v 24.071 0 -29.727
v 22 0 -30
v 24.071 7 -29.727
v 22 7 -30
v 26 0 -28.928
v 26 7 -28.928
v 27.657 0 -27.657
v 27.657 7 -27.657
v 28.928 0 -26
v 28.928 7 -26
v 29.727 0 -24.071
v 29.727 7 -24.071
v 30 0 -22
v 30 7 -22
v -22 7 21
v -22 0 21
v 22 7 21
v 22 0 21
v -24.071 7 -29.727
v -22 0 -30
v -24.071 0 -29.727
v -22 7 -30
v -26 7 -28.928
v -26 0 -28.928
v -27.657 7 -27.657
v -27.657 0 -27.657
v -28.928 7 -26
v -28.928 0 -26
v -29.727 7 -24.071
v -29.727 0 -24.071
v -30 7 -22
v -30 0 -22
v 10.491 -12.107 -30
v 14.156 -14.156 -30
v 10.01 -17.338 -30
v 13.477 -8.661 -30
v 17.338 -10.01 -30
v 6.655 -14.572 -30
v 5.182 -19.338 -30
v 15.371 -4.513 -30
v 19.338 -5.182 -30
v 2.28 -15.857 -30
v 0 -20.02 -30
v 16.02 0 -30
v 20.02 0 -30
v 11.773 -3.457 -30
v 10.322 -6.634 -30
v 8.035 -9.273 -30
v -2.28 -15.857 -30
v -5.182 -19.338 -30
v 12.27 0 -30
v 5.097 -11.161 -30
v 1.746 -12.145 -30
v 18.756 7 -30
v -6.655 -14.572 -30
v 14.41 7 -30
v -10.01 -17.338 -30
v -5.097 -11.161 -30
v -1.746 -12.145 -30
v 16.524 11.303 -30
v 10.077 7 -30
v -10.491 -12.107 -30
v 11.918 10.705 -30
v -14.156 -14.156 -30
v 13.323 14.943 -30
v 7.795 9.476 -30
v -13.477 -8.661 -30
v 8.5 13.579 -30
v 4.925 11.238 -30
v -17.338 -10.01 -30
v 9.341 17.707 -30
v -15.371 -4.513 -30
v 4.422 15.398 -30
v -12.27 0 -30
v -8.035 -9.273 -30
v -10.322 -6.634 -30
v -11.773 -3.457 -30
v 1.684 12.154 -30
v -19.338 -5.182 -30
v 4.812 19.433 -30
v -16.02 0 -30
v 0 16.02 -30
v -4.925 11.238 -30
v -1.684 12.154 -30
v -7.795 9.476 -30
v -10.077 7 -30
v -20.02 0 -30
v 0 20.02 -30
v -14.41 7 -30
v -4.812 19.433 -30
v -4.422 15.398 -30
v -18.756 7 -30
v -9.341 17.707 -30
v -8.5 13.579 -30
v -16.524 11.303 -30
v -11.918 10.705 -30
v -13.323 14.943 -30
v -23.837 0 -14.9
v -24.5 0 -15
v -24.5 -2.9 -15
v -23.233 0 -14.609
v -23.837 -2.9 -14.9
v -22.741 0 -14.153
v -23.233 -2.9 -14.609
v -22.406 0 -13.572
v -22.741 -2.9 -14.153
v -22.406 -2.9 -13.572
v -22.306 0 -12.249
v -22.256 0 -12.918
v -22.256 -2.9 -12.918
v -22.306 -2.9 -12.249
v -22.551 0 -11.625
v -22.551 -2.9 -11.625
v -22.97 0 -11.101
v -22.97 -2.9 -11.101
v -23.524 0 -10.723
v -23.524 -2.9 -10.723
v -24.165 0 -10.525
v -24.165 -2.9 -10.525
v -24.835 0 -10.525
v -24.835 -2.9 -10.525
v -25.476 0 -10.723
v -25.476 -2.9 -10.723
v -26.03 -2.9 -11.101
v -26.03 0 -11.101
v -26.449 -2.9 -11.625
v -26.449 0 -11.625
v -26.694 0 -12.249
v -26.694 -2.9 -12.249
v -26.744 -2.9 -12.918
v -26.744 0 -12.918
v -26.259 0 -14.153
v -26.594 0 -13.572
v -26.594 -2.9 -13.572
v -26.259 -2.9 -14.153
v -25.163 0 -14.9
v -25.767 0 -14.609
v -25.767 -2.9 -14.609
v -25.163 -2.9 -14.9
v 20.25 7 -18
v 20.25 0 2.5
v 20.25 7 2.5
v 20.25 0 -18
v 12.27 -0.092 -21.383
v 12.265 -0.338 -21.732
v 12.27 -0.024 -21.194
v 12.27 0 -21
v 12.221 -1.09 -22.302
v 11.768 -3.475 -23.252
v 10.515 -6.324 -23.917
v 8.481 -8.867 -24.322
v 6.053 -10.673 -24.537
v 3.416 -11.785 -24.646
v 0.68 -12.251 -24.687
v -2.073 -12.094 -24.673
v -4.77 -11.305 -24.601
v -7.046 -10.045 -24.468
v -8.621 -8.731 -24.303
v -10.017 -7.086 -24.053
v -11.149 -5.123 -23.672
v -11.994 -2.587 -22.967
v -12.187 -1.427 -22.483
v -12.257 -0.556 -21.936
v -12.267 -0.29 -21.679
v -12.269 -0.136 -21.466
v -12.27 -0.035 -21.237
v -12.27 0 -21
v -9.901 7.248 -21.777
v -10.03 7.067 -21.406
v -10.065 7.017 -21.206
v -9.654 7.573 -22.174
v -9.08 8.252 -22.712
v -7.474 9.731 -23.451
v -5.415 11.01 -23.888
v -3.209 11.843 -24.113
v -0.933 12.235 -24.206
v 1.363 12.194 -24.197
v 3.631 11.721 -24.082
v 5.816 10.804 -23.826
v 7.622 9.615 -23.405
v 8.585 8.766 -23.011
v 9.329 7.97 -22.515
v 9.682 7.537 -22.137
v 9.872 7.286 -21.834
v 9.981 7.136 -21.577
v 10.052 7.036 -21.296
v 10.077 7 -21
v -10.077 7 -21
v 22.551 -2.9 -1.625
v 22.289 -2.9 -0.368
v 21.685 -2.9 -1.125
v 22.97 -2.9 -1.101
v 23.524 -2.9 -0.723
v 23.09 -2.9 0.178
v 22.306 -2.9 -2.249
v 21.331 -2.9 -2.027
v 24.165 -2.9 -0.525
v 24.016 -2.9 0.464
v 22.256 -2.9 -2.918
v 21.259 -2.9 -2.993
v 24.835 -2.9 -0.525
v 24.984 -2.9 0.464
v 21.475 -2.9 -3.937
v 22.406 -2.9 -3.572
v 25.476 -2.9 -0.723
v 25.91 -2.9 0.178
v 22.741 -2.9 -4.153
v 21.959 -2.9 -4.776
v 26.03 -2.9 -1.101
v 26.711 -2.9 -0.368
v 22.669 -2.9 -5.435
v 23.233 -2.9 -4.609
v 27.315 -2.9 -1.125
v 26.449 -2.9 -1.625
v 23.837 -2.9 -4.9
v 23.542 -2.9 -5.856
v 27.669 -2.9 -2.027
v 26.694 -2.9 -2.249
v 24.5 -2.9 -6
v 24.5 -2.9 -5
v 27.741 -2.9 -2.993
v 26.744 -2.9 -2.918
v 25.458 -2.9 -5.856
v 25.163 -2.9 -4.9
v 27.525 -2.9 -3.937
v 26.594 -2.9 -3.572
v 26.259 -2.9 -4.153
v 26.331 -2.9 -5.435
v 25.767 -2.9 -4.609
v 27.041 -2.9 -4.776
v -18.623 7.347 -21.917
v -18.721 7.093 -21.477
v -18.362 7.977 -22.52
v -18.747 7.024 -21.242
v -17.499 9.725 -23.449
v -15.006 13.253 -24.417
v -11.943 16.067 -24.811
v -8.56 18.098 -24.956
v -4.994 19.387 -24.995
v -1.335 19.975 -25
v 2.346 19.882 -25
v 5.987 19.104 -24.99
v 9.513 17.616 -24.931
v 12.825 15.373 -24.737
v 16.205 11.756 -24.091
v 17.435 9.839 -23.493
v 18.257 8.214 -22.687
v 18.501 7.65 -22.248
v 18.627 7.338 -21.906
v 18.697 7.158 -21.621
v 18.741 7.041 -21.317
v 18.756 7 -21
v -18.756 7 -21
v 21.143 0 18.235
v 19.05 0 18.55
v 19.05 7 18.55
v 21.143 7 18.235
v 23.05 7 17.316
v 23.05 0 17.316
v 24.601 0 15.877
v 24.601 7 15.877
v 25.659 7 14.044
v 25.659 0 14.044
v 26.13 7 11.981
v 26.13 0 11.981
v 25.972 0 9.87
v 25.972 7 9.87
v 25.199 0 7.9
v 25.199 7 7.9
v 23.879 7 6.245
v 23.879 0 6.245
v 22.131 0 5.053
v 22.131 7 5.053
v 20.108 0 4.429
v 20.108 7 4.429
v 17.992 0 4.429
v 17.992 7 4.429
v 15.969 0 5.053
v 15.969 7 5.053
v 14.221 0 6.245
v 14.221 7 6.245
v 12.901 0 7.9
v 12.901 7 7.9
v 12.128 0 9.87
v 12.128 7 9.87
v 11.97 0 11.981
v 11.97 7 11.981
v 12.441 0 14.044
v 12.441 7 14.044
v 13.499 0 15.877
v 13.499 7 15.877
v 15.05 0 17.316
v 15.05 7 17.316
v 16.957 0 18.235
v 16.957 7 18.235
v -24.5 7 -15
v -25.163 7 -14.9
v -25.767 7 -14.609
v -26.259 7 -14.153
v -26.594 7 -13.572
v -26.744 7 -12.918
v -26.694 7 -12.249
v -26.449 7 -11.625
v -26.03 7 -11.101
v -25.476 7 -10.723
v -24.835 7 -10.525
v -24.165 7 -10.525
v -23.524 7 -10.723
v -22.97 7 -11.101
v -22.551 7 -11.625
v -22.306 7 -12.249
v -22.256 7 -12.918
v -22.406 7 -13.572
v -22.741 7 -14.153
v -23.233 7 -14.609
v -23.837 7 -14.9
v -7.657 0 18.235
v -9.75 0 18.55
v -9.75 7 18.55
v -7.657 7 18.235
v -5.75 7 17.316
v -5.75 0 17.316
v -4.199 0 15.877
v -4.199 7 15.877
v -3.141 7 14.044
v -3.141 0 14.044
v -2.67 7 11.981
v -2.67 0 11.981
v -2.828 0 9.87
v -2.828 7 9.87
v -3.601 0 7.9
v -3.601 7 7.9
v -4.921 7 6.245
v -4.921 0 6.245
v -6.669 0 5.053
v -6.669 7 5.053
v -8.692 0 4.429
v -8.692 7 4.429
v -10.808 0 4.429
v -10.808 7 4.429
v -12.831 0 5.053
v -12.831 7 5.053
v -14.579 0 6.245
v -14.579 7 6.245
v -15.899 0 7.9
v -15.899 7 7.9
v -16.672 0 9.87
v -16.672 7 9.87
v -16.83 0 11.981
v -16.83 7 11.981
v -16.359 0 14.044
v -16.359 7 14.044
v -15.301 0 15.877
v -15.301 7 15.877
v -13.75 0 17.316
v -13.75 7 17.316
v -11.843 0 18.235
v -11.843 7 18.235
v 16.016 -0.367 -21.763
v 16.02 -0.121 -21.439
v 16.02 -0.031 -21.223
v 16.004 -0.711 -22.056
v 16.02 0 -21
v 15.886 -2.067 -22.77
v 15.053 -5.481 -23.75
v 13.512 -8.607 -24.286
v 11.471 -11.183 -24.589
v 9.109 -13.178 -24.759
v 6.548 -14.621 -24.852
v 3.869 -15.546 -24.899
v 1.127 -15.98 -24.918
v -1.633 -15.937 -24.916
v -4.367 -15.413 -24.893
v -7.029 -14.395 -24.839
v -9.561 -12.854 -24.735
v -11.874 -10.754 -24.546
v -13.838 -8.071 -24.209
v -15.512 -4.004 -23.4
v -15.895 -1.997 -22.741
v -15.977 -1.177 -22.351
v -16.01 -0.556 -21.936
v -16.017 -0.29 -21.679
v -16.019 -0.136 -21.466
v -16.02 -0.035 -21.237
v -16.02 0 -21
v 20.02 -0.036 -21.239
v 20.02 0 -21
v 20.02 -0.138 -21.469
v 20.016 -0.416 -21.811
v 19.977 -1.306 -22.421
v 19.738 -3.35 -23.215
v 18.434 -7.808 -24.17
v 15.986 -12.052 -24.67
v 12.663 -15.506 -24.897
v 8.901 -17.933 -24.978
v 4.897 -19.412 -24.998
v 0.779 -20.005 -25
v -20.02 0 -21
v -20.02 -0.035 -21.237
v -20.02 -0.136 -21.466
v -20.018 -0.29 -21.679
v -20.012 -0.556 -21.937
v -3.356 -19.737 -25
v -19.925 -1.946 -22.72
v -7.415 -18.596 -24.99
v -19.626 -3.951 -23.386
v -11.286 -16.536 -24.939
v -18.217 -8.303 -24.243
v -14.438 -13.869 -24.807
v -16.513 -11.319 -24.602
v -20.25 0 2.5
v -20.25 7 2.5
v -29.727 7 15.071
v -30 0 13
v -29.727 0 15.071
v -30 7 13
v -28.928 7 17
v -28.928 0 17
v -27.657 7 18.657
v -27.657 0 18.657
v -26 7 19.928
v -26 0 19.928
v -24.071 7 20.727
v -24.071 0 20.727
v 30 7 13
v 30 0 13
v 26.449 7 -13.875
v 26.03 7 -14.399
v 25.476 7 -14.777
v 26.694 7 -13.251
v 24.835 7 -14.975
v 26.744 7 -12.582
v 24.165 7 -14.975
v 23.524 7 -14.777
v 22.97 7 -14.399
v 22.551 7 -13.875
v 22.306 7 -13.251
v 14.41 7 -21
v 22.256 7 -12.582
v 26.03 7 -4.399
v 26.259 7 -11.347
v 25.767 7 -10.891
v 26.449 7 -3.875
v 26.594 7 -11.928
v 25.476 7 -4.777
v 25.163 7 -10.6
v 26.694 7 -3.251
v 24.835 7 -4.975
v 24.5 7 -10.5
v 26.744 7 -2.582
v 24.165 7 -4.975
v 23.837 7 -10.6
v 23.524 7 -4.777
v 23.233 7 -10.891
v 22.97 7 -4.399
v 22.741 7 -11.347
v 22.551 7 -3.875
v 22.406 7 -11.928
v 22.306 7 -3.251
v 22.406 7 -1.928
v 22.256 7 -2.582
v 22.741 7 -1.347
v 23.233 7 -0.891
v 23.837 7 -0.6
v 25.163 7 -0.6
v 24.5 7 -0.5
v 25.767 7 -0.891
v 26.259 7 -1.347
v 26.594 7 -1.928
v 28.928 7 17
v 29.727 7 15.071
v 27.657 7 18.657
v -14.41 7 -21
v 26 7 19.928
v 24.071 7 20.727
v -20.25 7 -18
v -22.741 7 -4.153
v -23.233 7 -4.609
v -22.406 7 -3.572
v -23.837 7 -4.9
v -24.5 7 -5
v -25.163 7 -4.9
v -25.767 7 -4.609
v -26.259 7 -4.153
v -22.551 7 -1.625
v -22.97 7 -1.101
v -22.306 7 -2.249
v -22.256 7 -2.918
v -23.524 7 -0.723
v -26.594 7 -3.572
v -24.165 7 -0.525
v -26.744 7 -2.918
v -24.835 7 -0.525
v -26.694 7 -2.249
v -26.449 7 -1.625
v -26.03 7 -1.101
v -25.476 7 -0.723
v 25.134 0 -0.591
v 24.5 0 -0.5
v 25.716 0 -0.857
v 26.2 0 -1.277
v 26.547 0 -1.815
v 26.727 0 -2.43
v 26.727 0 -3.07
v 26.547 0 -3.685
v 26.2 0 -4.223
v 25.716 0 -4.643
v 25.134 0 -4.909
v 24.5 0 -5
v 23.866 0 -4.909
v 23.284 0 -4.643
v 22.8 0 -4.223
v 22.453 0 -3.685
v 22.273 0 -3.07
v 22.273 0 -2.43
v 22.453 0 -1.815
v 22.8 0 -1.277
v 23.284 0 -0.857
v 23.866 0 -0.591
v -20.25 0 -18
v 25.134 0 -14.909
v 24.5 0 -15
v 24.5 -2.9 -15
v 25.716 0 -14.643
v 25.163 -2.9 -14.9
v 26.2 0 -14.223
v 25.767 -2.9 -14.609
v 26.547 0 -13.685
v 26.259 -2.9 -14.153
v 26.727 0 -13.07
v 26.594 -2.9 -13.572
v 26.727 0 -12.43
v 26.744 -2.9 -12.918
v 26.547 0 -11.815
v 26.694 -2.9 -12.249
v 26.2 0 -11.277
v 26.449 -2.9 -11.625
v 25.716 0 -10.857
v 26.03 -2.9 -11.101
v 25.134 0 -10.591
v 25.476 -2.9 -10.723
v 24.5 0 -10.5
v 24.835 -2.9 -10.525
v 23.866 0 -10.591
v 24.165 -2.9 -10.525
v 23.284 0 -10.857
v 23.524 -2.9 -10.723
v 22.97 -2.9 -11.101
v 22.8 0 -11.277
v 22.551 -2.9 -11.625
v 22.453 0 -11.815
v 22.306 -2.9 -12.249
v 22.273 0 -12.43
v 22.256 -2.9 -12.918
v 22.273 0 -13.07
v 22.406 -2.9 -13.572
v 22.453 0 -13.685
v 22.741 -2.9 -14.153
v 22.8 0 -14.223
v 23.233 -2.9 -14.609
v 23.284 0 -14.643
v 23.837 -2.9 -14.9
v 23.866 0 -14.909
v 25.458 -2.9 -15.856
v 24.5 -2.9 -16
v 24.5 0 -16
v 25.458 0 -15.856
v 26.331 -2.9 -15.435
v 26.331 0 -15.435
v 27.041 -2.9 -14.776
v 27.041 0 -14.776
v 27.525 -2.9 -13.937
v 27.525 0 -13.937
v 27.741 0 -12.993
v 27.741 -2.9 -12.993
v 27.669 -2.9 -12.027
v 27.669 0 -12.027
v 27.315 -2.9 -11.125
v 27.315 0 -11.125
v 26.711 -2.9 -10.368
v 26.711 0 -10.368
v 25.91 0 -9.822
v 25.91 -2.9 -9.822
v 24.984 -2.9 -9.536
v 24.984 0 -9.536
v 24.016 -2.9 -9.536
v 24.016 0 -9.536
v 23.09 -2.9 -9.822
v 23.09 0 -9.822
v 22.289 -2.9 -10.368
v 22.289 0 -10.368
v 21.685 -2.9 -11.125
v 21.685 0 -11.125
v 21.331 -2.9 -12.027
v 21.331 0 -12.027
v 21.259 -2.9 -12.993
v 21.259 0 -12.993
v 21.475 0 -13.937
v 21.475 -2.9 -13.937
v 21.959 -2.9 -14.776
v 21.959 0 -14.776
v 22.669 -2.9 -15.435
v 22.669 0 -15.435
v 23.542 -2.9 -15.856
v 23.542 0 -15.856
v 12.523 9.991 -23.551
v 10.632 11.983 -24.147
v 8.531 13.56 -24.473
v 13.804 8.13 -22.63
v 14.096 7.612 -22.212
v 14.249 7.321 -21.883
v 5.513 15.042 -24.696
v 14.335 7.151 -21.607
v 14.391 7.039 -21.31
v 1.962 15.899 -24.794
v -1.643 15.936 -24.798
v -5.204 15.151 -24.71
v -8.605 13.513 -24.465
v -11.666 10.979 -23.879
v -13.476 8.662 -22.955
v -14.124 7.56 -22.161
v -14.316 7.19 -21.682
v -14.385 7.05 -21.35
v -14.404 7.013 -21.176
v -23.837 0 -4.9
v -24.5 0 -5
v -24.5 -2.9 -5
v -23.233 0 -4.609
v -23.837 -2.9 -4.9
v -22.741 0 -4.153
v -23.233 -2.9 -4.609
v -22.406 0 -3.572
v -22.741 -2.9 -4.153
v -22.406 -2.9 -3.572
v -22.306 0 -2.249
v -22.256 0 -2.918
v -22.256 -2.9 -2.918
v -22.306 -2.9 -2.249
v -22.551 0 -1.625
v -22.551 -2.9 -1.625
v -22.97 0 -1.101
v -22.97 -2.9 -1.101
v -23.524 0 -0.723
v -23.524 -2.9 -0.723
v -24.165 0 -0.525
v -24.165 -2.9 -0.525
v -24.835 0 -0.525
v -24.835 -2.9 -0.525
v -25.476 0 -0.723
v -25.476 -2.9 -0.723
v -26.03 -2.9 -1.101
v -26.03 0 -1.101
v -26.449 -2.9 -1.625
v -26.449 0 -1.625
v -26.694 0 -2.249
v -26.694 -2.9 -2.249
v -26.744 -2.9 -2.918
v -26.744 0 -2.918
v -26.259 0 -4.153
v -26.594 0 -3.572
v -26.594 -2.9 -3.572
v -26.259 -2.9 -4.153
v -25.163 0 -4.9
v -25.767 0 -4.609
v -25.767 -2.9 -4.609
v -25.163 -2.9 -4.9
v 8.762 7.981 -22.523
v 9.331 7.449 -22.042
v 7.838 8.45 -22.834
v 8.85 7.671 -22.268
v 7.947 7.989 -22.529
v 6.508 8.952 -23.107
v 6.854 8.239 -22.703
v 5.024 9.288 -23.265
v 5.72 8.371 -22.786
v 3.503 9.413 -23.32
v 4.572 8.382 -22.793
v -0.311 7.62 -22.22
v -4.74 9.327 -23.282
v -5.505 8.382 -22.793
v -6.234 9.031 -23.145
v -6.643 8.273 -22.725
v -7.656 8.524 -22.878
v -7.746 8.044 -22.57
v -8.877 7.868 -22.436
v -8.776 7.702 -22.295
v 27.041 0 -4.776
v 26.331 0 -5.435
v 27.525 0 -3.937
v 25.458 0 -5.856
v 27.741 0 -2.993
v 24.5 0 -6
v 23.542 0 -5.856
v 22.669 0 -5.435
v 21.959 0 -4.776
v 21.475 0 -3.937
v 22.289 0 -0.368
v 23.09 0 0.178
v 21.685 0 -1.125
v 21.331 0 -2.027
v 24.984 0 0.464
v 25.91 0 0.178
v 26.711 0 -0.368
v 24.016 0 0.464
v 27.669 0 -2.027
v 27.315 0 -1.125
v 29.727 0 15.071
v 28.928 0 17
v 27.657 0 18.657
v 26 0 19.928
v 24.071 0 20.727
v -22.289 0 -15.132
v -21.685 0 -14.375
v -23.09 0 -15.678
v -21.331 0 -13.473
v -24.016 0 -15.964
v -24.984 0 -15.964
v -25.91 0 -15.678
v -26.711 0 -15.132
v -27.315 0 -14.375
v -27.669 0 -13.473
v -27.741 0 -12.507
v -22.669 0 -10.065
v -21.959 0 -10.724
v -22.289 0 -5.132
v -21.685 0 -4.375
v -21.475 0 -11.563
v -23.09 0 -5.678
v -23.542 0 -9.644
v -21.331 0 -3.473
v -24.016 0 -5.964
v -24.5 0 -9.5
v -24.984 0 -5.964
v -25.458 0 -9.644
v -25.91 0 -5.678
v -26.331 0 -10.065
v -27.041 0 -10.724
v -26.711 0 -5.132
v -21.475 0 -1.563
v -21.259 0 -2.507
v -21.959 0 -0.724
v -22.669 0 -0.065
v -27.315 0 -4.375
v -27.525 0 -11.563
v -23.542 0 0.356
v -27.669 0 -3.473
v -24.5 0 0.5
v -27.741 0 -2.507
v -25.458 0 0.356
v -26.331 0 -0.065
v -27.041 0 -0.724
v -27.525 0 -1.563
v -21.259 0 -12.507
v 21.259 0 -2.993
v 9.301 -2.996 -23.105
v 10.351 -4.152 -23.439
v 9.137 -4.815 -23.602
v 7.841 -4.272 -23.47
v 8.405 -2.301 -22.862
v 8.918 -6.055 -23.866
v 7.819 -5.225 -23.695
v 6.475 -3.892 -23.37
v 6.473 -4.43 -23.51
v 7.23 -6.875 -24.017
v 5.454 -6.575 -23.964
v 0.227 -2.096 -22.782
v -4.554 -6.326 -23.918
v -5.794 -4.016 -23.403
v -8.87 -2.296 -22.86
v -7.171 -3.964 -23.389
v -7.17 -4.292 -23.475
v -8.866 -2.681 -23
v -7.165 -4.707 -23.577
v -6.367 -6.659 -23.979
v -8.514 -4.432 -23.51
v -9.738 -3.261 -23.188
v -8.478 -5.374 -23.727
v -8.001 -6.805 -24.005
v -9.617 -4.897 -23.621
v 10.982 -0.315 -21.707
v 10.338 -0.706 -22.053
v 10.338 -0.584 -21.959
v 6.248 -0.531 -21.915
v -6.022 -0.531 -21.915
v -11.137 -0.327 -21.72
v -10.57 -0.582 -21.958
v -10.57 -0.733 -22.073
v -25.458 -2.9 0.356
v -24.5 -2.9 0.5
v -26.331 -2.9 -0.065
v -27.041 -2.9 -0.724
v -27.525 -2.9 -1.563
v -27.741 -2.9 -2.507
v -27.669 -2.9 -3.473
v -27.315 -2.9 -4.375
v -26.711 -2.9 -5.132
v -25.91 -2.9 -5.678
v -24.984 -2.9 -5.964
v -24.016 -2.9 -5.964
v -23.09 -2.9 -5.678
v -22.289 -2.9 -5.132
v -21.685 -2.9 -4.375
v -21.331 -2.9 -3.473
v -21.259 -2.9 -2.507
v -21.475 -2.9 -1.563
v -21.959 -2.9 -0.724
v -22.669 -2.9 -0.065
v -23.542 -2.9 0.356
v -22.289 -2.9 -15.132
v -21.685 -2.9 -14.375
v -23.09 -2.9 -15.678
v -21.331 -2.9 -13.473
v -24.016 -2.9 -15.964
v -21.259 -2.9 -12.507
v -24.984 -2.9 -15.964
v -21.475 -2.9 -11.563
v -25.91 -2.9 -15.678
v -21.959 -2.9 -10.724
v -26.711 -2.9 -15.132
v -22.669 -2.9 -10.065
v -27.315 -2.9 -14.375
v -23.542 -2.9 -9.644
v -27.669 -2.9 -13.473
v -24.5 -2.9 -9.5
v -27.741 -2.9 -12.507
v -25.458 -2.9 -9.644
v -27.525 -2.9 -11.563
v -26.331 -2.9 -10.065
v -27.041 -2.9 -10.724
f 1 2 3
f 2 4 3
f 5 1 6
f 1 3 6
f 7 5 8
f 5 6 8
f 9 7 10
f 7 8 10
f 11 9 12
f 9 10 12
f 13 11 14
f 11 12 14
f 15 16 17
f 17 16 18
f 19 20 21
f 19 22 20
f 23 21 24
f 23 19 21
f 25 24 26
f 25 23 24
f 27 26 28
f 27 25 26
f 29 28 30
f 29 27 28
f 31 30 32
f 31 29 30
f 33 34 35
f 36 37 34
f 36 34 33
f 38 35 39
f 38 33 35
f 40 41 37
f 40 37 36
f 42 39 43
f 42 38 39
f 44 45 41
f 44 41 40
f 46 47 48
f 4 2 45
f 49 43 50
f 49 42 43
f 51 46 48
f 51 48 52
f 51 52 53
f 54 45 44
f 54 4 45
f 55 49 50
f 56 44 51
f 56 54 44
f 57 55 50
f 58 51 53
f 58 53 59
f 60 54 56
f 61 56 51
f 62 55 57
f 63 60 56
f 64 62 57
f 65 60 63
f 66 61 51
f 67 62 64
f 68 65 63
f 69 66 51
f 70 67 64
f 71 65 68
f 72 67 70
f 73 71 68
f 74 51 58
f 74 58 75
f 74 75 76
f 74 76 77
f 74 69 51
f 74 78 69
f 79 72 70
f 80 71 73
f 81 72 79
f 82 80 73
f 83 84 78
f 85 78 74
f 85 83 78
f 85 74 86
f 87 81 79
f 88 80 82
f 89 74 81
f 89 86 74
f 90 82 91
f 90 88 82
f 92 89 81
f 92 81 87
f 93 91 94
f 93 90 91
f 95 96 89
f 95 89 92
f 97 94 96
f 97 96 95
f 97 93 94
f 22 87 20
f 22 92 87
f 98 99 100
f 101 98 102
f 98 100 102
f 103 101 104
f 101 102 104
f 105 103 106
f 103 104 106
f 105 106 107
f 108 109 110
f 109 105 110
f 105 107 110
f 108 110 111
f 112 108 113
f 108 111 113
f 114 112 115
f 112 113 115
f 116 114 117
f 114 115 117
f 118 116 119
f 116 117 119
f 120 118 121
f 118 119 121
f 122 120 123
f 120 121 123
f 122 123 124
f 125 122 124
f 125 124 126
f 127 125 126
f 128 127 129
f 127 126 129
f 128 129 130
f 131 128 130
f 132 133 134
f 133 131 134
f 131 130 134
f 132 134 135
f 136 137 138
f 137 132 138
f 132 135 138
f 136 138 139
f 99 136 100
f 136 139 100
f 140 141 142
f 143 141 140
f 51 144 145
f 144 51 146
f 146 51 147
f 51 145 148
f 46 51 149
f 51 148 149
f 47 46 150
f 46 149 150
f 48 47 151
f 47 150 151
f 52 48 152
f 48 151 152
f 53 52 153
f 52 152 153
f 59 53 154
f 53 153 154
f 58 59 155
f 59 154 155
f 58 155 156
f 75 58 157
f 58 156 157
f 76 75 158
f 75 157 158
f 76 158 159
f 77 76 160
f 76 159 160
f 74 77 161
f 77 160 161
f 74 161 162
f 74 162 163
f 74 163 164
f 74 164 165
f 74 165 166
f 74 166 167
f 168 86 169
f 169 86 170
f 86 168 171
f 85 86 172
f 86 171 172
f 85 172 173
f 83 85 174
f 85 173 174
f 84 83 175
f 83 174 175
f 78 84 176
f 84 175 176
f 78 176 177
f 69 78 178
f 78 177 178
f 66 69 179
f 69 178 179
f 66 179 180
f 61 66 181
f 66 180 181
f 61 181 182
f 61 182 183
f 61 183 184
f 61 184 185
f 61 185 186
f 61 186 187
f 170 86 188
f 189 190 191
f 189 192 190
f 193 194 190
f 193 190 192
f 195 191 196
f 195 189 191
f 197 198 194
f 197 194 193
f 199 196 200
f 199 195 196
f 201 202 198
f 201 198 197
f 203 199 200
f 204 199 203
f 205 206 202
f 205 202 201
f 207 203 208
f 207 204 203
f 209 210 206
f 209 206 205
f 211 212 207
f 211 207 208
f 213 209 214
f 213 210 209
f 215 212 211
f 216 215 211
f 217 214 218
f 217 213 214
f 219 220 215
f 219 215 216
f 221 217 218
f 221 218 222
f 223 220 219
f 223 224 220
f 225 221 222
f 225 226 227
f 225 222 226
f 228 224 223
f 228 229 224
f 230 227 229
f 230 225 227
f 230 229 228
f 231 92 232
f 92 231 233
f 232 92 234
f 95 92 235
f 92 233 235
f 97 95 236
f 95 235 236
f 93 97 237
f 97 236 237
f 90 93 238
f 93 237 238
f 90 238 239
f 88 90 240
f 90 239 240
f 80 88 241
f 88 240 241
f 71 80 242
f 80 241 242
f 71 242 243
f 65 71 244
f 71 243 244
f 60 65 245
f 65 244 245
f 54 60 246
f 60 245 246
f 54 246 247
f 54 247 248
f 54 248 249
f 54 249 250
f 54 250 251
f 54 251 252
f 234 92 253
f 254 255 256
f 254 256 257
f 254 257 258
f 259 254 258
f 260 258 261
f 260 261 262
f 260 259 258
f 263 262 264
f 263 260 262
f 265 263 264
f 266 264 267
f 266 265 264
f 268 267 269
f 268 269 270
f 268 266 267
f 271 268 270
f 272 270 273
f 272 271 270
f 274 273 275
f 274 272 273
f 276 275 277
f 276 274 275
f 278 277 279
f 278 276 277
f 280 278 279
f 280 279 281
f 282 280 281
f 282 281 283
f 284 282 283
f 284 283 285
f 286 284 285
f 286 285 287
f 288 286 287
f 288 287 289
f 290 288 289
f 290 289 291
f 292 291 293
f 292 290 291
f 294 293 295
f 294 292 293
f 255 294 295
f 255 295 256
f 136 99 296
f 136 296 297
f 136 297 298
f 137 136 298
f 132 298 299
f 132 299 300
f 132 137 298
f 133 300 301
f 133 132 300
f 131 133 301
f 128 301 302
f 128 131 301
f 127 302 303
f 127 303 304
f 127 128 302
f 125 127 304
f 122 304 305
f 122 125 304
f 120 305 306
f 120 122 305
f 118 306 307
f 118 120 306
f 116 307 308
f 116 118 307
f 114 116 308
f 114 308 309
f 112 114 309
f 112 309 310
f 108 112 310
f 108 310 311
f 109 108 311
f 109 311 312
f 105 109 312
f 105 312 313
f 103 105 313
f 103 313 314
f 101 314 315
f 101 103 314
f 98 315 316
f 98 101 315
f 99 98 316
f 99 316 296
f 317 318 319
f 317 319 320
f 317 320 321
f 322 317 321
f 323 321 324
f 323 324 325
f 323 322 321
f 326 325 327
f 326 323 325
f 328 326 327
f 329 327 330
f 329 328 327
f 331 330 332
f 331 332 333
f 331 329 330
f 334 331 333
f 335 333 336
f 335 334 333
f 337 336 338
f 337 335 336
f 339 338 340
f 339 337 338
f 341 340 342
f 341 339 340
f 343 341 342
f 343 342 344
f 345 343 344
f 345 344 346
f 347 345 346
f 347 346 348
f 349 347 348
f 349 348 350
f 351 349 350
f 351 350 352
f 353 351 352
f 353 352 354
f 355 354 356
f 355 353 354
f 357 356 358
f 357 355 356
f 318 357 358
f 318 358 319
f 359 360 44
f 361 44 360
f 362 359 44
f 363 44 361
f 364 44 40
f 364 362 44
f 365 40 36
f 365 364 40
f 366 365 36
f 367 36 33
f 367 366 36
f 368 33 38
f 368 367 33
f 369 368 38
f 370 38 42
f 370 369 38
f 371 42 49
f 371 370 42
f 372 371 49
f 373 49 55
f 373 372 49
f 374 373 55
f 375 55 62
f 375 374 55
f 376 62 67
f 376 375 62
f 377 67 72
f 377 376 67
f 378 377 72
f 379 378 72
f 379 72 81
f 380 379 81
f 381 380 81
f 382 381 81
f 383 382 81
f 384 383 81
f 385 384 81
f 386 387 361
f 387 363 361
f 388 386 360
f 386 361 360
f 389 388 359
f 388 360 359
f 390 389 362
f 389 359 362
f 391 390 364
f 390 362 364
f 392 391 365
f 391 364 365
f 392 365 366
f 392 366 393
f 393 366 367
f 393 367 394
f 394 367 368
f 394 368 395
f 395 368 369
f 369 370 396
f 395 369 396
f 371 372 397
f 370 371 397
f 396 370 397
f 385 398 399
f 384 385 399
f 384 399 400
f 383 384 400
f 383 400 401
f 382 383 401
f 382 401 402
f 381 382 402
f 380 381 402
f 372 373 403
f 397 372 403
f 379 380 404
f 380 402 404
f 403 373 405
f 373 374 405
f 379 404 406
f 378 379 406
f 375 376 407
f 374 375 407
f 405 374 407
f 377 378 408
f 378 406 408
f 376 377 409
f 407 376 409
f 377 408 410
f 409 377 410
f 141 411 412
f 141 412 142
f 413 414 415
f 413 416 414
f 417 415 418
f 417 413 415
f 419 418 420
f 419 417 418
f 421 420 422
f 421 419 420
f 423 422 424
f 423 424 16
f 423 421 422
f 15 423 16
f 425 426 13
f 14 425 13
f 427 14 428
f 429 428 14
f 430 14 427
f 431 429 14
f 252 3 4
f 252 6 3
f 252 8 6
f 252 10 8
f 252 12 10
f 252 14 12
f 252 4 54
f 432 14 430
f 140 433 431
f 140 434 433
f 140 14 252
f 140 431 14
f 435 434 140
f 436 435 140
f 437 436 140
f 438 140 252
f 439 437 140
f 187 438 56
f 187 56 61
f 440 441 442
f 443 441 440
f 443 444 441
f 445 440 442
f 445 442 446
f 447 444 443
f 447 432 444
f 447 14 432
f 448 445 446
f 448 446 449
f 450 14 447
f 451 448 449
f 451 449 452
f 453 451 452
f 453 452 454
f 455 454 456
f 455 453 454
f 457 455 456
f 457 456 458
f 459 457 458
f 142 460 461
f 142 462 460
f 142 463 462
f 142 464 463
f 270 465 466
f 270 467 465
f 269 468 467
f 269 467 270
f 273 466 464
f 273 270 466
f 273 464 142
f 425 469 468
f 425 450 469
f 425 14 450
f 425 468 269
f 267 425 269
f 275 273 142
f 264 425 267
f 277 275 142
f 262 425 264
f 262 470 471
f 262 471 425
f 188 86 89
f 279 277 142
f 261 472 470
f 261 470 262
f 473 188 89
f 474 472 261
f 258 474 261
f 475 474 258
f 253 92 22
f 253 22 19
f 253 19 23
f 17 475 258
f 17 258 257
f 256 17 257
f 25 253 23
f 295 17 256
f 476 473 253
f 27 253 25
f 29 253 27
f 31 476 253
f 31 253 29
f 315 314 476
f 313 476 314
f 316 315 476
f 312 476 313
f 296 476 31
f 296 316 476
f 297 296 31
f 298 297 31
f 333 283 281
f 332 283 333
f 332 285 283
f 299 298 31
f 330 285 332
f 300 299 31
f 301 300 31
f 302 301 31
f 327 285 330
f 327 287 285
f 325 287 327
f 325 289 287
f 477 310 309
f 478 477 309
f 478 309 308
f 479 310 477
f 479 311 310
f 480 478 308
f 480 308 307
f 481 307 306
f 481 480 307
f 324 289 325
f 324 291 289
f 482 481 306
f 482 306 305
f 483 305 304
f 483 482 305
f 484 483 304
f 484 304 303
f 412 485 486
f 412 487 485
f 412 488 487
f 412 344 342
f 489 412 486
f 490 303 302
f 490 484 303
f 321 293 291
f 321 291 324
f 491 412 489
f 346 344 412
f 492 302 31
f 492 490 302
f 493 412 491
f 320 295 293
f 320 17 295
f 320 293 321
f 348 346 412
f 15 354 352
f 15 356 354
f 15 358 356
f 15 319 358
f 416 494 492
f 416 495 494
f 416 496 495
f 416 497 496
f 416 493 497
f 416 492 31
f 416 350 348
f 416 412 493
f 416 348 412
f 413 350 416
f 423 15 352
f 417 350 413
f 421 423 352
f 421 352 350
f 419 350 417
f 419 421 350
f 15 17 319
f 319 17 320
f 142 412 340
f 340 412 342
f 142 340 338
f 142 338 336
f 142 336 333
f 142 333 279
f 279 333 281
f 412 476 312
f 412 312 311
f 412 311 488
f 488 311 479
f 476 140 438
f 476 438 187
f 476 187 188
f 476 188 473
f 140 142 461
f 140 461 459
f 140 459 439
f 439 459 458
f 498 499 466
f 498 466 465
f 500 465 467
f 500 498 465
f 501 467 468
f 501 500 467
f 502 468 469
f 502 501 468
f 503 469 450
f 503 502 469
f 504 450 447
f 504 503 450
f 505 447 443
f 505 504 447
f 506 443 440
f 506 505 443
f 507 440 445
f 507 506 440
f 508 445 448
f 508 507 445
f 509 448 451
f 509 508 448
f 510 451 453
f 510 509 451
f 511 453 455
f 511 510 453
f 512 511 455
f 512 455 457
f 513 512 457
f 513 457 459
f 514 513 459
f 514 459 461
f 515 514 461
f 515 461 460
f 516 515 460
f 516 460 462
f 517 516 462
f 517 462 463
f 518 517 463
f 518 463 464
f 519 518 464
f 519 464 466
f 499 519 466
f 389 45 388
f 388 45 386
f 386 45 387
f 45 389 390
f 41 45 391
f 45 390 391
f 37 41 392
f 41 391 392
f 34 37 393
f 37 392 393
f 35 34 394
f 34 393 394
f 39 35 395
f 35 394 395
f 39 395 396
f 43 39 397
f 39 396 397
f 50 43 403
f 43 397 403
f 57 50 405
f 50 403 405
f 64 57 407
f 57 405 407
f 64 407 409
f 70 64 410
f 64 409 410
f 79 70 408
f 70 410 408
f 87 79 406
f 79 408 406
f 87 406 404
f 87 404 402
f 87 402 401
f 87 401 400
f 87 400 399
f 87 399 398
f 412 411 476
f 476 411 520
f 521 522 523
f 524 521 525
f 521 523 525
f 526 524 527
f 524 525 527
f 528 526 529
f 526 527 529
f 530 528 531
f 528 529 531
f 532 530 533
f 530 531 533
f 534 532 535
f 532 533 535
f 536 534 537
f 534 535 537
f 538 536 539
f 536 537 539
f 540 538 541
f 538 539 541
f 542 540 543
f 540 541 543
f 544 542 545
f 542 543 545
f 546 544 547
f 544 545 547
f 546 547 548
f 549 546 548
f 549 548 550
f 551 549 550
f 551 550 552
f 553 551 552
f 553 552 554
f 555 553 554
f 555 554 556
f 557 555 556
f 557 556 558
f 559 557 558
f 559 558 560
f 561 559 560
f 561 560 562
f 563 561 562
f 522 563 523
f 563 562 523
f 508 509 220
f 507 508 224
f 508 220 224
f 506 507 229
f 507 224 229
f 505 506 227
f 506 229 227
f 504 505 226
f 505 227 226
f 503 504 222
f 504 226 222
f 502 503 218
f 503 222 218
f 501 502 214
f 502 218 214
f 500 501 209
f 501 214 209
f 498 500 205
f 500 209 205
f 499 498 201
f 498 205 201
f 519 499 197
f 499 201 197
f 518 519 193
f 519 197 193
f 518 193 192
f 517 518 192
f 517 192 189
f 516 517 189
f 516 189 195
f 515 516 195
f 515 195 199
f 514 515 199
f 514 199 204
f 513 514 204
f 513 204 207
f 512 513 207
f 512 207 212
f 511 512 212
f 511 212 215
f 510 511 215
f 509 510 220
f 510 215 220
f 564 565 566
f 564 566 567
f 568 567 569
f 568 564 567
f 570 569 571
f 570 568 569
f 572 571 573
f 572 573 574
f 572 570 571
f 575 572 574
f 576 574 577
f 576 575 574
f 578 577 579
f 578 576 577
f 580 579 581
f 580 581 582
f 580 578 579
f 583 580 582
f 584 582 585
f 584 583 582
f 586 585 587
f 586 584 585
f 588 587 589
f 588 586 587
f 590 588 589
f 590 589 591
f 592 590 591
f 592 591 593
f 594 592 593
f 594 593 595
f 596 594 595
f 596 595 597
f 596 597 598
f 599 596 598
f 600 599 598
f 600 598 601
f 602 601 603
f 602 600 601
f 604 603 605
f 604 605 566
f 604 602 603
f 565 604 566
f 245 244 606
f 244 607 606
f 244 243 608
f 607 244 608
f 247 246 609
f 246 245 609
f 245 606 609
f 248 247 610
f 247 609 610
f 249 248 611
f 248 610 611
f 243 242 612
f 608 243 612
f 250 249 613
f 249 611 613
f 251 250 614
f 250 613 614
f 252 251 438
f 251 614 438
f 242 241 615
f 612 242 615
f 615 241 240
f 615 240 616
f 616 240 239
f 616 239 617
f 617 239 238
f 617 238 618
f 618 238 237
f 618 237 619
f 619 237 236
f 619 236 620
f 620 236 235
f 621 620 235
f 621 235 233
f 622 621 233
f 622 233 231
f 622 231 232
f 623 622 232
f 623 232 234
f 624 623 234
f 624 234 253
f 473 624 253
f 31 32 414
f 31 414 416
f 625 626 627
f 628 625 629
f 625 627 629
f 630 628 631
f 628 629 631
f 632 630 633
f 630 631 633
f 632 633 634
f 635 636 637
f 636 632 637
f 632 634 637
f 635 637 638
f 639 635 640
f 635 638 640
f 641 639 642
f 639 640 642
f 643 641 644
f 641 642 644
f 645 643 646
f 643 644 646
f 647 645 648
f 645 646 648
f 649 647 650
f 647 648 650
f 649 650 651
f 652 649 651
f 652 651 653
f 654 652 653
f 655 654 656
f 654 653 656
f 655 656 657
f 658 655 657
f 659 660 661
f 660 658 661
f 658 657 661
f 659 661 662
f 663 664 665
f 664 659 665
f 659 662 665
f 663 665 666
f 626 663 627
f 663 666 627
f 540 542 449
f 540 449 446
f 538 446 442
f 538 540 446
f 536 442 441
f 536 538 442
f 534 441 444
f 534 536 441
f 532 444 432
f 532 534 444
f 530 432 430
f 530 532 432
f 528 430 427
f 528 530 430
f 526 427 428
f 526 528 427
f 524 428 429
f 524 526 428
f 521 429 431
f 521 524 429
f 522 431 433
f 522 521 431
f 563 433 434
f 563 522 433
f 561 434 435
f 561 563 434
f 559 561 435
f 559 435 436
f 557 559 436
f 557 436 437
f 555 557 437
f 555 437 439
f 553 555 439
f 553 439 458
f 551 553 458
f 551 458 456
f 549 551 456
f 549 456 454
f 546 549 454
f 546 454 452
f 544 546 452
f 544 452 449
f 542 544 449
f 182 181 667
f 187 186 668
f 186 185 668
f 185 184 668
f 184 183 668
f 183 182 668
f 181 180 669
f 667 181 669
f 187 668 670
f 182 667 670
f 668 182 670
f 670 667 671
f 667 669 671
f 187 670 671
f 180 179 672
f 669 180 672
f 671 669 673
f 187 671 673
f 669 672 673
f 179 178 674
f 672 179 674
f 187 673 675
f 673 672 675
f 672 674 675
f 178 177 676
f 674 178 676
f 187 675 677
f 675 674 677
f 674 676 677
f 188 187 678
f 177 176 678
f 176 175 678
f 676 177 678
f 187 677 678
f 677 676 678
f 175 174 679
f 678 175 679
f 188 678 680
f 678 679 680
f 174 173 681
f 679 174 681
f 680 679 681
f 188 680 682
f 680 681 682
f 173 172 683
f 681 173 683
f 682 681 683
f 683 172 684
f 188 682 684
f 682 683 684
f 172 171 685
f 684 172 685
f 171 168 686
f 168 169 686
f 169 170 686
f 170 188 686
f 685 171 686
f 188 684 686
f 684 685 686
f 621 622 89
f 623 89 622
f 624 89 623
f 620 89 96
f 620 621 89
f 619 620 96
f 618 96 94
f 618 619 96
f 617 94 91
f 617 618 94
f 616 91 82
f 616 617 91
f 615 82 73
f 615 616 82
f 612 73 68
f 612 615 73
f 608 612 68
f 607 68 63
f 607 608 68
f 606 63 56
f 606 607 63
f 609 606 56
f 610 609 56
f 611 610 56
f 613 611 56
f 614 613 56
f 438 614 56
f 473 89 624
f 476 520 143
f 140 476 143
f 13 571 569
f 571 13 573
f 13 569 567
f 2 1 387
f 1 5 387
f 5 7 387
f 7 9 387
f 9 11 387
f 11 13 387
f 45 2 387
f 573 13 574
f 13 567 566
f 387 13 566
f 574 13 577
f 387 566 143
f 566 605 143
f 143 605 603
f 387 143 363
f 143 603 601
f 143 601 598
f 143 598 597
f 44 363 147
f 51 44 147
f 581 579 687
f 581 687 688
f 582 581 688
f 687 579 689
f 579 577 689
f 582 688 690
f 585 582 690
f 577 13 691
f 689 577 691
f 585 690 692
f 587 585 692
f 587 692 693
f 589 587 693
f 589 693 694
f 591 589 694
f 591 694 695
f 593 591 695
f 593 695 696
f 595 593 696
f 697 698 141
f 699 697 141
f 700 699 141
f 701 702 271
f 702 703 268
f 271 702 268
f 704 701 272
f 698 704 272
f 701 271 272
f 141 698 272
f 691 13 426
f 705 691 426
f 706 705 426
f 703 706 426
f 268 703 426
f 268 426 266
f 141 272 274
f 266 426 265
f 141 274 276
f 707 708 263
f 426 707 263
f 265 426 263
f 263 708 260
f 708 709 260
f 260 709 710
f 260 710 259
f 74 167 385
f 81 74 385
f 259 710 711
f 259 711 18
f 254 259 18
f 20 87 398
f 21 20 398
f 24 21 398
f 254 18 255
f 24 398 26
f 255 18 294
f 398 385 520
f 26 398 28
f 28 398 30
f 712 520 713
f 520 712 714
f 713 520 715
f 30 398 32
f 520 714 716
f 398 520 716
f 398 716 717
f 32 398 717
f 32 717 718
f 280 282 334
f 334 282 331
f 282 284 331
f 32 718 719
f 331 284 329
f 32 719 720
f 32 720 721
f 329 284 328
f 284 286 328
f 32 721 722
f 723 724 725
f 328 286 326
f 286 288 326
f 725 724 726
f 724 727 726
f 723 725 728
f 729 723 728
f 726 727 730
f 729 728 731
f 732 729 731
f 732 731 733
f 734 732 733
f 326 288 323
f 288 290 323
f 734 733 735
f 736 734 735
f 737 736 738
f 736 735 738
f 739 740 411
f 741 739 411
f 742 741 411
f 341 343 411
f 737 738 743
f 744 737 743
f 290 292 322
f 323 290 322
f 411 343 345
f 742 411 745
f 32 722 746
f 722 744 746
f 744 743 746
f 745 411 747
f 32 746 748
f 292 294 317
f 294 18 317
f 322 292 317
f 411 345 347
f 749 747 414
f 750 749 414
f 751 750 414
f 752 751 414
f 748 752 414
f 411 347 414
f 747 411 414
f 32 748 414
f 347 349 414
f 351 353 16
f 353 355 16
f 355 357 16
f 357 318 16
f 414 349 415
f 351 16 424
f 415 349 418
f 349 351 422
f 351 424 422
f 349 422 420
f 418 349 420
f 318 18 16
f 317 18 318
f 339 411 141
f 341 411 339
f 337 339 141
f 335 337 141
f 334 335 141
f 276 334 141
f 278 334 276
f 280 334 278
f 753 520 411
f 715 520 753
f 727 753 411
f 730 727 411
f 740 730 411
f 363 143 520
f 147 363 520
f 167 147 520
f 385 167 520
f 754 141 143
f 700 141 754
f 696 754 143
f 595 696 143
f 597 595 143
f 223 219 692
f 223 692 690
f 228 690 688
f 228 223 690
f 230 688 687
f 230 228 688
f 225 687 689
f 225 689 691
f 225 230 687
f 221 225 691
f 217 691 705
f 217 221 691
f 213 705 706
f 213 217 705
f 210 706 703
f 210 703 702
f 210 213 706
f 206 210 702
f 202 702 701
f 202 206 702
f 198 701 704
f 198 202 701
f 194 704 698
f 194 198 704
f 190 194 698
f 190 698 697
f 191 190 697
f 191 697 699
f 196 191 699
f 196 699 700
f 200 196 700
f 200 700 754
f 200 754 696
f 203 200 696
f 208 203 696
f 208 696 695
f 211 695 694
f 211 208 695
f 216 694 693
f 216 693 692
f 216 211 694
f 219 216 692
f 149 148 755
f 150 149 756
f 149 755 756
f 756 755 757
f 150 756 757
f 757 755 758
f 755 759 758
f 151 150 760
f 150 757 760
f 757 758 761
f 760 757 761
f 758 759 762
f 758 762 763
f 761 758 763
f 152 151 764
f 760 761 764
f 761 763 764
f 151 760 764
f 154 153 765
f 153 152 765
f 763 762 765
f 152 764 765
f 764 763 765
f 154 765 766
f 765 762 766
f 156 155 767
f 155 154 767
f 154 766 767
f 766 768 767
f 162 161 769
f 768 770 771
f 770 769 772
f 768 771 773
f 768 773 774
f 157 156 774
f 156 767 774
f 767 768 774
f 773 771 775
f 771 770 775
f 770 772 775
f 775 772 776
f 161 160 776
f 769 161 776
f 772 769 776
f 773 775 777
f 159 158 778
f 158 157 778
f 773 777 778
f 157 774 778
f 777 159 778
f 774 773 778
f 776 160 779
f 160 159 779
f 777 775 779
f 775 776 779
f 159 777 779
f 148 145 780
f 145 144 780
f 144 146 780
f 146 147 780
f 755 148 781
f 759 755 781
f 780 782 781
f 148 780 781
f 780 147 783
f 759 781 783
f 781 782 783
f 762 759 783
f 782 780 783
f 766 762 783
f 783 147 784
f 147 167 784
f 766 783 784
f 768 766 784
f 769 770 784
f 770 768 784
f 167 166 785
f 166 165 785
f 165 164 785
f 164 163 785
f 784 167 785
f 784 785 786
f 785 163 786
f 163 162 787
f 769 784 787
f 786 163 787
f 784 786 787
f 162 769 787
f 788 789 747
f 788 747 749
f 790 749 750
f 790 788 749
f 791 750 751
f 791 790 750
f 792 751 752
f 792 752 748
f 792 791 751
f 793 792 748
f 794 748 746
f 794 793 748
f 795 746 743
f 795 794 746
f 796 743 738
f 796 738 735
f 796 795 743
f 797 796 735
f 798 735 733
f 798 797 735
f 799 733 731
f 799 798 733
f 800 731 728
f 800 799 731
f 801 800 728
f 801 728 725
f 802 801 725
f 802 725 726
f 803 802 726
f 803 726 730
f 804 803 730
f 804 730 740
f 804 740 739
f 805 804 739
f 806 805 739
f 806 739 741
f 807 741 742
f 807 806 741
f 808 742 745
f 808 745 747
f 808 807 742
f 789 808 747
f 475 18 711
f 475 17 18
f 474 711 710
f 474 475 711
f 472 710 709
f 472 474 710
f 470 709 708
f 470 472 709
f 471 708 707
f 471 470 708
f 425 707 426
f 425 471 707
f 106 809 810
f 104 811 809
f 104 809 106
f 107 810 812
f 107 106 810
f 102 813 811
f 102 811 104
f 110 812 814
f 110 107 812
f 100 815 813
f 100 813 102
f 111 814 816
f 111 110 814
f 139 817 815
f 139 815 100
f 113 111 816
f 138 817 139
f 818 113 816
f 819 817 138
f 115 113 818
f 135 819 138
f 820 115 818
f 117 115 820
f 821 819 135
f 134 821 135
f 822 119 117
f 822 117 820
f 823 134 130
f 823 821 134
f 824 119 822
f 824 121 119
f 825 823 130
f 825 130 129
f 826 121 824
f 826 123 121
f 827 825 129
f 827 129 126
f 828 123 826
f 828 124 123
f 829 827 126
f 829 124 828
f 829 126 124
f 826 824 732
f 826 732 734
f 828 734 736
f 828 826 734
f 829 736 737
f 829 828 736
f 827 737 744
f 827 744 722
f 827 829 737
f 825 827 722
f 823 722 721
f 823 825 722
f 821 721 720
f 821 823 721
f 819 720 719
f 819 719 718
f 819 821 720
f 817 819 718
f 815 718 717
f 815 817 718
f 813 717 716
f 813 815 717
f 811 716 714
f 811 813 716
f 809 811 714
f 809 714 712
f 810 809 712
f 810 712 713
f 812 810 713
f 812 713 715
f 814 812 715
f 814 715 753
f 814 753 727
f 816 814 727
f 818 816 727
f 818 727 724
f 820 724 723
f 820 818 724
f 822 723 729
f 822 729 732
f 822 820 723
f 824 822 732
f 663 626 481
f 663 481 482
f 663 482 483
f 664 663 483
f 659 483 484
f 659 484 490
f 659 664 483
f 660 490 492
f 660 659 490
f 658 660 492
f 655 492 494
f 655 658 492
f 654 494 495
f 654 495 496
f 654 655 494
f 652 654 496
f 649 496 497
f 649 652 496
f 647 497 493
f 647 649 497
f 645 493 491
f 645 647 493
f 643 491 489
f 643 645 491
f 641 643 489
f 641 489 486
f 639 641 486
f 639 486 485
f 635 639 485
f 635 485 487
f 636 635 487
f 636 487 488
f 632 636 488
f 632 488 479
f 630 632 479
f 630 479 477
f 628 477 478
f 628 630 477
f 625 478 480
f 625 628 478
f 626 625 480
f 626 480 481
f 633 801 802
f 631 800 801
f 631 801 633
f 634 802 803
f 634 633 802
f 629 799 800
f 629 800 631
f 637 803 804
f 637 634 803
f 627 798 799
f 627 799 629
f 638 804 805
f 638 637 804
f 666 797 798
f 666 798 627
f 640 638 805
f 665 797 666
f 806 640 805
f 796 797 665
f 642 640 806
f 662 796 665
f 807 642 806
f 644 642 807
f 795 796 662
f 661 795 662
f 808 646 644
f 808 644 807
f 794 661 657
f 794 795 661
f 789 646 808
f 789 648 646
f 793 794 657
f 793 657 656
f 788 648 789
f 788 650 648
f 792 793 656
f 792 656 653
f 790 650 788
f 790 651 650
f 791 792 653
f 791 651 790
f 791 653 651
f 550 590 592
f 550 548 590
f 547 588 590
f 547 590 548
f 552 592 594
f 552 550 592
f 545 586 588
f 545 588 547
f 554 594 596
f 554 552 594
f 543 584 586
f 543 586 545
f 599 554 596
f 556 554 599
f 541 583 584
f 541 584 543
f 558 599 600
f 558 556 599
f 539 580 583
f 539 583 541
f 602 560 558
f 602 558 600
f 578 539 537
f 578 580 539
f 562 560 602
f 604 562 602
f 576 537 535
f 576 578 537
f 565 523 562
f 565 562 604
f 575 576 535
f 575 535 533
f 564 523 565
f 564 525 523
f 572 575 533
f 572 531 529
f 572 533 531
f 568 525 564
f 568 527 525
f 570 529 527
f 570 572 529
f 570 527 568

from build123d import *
from build123d.topology import SkipClean

# Parameters (mm, degrees)
SKETCH1_W           = 60
SKETCH1_H           = 42
SKETCH1_R           = 7.1
SKETCH1_R_2         = 2.25
SKETCH1_W_2         = 40.5
SKETCH1_H_2         = 20.5
BOSS_EXTRUDE1_DEPTH = 7
BOSS_EXTRUDE2_START = 2.9
SKETCH2_R           = 3.25
SKETCH2_R_2         = 2.25
BOSS_EXTRUDE2_DEPTH = 2.9
SKETCH3_R           = 20.02
SKETCH3_R_2         = 16.02
SKETCH3_R_3         = 12.27
SKETCH3_W           = 60
SKETCH3_H           = 7
BOSS_EXTRUDE3_DEPTH = 9
SKETCH4_RX          = 13.02
SKETCH4_RY          = 4
SKETCH4_RX_2        = 20.02
CUT_EXTRUDE1_DEPTH  = 71.005716909
FILLET1_R           = 8


with BuildPart() as part:
    # Sketch1 → Boss-Extrude1 (new body)
    with BuildSketch(Plane(origin=(0, 0, 0), x_dir=(1, 0, 0), z_dir=(0, 1, 0))):
        Rectangle(SKETCH1_W, SKETCH1_H)
        with Locations(Location((-9.75, -11.45, 0), (0, 0, 270))):
            Circle(SKETCH1_R, mode=Mode.SUBTRACT)
        with Locations(Location((19.05, -11.45, 0), (0, 0, 270))):
            Circle(SKETCH1_R, mode=Mode.SUBTRACT)
        with Locations(Location((24.5, 12.75, 0), (0, 0, 270))):
            Circle(SKETCH1_R_2, mode=Mode.SUBTRACT)
        with Locations(Location((24.5, 2.75, 0), (0, 0, 270))):
            Circle(SKETCH1_R_2, mode=Mode.SUBTRACT)
        with Locations(Location((-24.5, 2.75, 0), (0, 0, 90))):
            Circle(SKETCH1_R_2, mode=Mode.SUBTRACT)
        with Locations(Location((-24.5, 12.75, 0), (0, 0, 90))):
            Circle(SKETCH1_R_2, mode=Mode.SUBTRACT)
        with Locations((0, 7.75)):
            Rectangle(SKETCH1_W_2, SKETCH1_H_2, mode=Mode.SUBTRACT)
    extrude(amount=BOSS_EXTRUDE1_DEPTH)

    # Sketch2 → Boss-Extrude2 (add)
    # profile 1 of 4: a face of its own
    with SkipClean():  # the faces are left unmerged after this step: merging them gives an invalid solid
        with BuildSketch(Plane.XZ.offset(BOSS_EXTRUDE2_START)):
            with Locations(Location((24.5, -2.75, 0), (0, 0, 270))):
                Circle(SKETCH2_R)
            with Locations(Location((24.5, -2.75, 0), (0, 0, 270))):
                Circle(SKETCH2_R_2, mode=Mode.SUBTRACT)
        # profile 2 of 4: a face of its own
        with BuildSketch(Plane.XZ.offset(BOSS_EXTRUDE2_START)):
            with Locations(Location((24.5, -12.75, 0), (0, 0, 270))):
                Circle(SKETCH2_R)
            with Locations(Location((24.5, -12.75, 0), (0, 0, 270))):
                Circle(SKETCH2_R_2, mode=Mode.SUBTRACT)
        # profile 3 of 4: a face of its own
        with BuildSketch(Plane.XZ.offset(BOSS_EXTRUDE2_START)):
            with Locations(Location((-24.5, -12.75, 0), (0, 0, 90))):
                Circle(SKETCH2_R)
            with Locations(Location((-24.5, -12.75, 0), (0, 0, 270))):
                Circle(SKETCH2_R_2, mode=Mode.SUBTRACT)
        # profile 4 of 4: a face of its own
        with BuildSketch(Plane.XZ.offset(BOSS_EXTRUDE2_START)):
            with Locations(Location((-24.5, -2.75, 0), (0, 0, 90))):
                Circle(SKETCH2_R)
            with Locations(Location((-24.5, -2.75, 0), (0, 0, 270))):
                Circle(SKETCH2_R_2, mode=Mode.SUBTRACT)
        extrude(amount=-BOSS_EXTRUDE2_DEPTH)

    # Sketch3 → Boss-Extrude3 (add)
    # profile 1 of 3: a face of its own
    with SkipClean():  # the faces are left unmerged after this step: merging them gives an invalid solid
        with BuildSketch(Plane(origin=(0, 0, -21), x_dir=(-1, 0, 0), z_dir=(0, 0, -1))):
            Circle(SKETCH3_R)
            Circle(SKETCH3_R_2, mode=Mode.SUBTRACT)
        # profile 2 of 3: a face of its own
        with BuildSketch(Plane(origin=(0, 0, -21), x_dir=(-1, 0, 0), z_dir=(0, 0, -1))):
            Circle(SKETCH3_R_3)
        # profile 3 of 3: a face of its own
        with BuildSketch(Plane(origin=(0, 0, -21), x_dir=(-1, 0, 0), z_dir=(0, 0, -1))):
            with Locations((0, 3.5)):
                Rectangle(SKETCH3_W, SKETCH3_H)
        extrude(amount=BOSS_EXTRUDE3_DEPTH)

    # Sketch4 → Cut-Extrude1 (cut, through all)
    with SkipClean():  # the faces are left unmerged after this step: merging them gives an invalid solid
        with BuildSketch(Plane.ZY.offset(30)):
            with Locations(Location((-21, 20.02), (0, 0, -90))):
                Ellipse(SKETCH4_RX, SKETCH4_RY)
            with Locations(Location((-21, -20.02), (0, 0, 90))):
                Ellipse(SKETCH4_RX_2, SKETCH4_RY)
        extrude(amount=-CUT_EXTRUDE1_DEPTH, mode=Mode.SUBTRACT)

    # Fillet1
    fillet1_edges = [part.edges().sort_by_distance(p)[0] for p in [
        (30, 3.5, 21),
        (-30, 3.5, 21),
        (-30, 3.5, -30),
        (30, 3.5, -30),
    ]]
    fillet(fillet1_edges, radius=FILLET1_R)


solid = part.part
